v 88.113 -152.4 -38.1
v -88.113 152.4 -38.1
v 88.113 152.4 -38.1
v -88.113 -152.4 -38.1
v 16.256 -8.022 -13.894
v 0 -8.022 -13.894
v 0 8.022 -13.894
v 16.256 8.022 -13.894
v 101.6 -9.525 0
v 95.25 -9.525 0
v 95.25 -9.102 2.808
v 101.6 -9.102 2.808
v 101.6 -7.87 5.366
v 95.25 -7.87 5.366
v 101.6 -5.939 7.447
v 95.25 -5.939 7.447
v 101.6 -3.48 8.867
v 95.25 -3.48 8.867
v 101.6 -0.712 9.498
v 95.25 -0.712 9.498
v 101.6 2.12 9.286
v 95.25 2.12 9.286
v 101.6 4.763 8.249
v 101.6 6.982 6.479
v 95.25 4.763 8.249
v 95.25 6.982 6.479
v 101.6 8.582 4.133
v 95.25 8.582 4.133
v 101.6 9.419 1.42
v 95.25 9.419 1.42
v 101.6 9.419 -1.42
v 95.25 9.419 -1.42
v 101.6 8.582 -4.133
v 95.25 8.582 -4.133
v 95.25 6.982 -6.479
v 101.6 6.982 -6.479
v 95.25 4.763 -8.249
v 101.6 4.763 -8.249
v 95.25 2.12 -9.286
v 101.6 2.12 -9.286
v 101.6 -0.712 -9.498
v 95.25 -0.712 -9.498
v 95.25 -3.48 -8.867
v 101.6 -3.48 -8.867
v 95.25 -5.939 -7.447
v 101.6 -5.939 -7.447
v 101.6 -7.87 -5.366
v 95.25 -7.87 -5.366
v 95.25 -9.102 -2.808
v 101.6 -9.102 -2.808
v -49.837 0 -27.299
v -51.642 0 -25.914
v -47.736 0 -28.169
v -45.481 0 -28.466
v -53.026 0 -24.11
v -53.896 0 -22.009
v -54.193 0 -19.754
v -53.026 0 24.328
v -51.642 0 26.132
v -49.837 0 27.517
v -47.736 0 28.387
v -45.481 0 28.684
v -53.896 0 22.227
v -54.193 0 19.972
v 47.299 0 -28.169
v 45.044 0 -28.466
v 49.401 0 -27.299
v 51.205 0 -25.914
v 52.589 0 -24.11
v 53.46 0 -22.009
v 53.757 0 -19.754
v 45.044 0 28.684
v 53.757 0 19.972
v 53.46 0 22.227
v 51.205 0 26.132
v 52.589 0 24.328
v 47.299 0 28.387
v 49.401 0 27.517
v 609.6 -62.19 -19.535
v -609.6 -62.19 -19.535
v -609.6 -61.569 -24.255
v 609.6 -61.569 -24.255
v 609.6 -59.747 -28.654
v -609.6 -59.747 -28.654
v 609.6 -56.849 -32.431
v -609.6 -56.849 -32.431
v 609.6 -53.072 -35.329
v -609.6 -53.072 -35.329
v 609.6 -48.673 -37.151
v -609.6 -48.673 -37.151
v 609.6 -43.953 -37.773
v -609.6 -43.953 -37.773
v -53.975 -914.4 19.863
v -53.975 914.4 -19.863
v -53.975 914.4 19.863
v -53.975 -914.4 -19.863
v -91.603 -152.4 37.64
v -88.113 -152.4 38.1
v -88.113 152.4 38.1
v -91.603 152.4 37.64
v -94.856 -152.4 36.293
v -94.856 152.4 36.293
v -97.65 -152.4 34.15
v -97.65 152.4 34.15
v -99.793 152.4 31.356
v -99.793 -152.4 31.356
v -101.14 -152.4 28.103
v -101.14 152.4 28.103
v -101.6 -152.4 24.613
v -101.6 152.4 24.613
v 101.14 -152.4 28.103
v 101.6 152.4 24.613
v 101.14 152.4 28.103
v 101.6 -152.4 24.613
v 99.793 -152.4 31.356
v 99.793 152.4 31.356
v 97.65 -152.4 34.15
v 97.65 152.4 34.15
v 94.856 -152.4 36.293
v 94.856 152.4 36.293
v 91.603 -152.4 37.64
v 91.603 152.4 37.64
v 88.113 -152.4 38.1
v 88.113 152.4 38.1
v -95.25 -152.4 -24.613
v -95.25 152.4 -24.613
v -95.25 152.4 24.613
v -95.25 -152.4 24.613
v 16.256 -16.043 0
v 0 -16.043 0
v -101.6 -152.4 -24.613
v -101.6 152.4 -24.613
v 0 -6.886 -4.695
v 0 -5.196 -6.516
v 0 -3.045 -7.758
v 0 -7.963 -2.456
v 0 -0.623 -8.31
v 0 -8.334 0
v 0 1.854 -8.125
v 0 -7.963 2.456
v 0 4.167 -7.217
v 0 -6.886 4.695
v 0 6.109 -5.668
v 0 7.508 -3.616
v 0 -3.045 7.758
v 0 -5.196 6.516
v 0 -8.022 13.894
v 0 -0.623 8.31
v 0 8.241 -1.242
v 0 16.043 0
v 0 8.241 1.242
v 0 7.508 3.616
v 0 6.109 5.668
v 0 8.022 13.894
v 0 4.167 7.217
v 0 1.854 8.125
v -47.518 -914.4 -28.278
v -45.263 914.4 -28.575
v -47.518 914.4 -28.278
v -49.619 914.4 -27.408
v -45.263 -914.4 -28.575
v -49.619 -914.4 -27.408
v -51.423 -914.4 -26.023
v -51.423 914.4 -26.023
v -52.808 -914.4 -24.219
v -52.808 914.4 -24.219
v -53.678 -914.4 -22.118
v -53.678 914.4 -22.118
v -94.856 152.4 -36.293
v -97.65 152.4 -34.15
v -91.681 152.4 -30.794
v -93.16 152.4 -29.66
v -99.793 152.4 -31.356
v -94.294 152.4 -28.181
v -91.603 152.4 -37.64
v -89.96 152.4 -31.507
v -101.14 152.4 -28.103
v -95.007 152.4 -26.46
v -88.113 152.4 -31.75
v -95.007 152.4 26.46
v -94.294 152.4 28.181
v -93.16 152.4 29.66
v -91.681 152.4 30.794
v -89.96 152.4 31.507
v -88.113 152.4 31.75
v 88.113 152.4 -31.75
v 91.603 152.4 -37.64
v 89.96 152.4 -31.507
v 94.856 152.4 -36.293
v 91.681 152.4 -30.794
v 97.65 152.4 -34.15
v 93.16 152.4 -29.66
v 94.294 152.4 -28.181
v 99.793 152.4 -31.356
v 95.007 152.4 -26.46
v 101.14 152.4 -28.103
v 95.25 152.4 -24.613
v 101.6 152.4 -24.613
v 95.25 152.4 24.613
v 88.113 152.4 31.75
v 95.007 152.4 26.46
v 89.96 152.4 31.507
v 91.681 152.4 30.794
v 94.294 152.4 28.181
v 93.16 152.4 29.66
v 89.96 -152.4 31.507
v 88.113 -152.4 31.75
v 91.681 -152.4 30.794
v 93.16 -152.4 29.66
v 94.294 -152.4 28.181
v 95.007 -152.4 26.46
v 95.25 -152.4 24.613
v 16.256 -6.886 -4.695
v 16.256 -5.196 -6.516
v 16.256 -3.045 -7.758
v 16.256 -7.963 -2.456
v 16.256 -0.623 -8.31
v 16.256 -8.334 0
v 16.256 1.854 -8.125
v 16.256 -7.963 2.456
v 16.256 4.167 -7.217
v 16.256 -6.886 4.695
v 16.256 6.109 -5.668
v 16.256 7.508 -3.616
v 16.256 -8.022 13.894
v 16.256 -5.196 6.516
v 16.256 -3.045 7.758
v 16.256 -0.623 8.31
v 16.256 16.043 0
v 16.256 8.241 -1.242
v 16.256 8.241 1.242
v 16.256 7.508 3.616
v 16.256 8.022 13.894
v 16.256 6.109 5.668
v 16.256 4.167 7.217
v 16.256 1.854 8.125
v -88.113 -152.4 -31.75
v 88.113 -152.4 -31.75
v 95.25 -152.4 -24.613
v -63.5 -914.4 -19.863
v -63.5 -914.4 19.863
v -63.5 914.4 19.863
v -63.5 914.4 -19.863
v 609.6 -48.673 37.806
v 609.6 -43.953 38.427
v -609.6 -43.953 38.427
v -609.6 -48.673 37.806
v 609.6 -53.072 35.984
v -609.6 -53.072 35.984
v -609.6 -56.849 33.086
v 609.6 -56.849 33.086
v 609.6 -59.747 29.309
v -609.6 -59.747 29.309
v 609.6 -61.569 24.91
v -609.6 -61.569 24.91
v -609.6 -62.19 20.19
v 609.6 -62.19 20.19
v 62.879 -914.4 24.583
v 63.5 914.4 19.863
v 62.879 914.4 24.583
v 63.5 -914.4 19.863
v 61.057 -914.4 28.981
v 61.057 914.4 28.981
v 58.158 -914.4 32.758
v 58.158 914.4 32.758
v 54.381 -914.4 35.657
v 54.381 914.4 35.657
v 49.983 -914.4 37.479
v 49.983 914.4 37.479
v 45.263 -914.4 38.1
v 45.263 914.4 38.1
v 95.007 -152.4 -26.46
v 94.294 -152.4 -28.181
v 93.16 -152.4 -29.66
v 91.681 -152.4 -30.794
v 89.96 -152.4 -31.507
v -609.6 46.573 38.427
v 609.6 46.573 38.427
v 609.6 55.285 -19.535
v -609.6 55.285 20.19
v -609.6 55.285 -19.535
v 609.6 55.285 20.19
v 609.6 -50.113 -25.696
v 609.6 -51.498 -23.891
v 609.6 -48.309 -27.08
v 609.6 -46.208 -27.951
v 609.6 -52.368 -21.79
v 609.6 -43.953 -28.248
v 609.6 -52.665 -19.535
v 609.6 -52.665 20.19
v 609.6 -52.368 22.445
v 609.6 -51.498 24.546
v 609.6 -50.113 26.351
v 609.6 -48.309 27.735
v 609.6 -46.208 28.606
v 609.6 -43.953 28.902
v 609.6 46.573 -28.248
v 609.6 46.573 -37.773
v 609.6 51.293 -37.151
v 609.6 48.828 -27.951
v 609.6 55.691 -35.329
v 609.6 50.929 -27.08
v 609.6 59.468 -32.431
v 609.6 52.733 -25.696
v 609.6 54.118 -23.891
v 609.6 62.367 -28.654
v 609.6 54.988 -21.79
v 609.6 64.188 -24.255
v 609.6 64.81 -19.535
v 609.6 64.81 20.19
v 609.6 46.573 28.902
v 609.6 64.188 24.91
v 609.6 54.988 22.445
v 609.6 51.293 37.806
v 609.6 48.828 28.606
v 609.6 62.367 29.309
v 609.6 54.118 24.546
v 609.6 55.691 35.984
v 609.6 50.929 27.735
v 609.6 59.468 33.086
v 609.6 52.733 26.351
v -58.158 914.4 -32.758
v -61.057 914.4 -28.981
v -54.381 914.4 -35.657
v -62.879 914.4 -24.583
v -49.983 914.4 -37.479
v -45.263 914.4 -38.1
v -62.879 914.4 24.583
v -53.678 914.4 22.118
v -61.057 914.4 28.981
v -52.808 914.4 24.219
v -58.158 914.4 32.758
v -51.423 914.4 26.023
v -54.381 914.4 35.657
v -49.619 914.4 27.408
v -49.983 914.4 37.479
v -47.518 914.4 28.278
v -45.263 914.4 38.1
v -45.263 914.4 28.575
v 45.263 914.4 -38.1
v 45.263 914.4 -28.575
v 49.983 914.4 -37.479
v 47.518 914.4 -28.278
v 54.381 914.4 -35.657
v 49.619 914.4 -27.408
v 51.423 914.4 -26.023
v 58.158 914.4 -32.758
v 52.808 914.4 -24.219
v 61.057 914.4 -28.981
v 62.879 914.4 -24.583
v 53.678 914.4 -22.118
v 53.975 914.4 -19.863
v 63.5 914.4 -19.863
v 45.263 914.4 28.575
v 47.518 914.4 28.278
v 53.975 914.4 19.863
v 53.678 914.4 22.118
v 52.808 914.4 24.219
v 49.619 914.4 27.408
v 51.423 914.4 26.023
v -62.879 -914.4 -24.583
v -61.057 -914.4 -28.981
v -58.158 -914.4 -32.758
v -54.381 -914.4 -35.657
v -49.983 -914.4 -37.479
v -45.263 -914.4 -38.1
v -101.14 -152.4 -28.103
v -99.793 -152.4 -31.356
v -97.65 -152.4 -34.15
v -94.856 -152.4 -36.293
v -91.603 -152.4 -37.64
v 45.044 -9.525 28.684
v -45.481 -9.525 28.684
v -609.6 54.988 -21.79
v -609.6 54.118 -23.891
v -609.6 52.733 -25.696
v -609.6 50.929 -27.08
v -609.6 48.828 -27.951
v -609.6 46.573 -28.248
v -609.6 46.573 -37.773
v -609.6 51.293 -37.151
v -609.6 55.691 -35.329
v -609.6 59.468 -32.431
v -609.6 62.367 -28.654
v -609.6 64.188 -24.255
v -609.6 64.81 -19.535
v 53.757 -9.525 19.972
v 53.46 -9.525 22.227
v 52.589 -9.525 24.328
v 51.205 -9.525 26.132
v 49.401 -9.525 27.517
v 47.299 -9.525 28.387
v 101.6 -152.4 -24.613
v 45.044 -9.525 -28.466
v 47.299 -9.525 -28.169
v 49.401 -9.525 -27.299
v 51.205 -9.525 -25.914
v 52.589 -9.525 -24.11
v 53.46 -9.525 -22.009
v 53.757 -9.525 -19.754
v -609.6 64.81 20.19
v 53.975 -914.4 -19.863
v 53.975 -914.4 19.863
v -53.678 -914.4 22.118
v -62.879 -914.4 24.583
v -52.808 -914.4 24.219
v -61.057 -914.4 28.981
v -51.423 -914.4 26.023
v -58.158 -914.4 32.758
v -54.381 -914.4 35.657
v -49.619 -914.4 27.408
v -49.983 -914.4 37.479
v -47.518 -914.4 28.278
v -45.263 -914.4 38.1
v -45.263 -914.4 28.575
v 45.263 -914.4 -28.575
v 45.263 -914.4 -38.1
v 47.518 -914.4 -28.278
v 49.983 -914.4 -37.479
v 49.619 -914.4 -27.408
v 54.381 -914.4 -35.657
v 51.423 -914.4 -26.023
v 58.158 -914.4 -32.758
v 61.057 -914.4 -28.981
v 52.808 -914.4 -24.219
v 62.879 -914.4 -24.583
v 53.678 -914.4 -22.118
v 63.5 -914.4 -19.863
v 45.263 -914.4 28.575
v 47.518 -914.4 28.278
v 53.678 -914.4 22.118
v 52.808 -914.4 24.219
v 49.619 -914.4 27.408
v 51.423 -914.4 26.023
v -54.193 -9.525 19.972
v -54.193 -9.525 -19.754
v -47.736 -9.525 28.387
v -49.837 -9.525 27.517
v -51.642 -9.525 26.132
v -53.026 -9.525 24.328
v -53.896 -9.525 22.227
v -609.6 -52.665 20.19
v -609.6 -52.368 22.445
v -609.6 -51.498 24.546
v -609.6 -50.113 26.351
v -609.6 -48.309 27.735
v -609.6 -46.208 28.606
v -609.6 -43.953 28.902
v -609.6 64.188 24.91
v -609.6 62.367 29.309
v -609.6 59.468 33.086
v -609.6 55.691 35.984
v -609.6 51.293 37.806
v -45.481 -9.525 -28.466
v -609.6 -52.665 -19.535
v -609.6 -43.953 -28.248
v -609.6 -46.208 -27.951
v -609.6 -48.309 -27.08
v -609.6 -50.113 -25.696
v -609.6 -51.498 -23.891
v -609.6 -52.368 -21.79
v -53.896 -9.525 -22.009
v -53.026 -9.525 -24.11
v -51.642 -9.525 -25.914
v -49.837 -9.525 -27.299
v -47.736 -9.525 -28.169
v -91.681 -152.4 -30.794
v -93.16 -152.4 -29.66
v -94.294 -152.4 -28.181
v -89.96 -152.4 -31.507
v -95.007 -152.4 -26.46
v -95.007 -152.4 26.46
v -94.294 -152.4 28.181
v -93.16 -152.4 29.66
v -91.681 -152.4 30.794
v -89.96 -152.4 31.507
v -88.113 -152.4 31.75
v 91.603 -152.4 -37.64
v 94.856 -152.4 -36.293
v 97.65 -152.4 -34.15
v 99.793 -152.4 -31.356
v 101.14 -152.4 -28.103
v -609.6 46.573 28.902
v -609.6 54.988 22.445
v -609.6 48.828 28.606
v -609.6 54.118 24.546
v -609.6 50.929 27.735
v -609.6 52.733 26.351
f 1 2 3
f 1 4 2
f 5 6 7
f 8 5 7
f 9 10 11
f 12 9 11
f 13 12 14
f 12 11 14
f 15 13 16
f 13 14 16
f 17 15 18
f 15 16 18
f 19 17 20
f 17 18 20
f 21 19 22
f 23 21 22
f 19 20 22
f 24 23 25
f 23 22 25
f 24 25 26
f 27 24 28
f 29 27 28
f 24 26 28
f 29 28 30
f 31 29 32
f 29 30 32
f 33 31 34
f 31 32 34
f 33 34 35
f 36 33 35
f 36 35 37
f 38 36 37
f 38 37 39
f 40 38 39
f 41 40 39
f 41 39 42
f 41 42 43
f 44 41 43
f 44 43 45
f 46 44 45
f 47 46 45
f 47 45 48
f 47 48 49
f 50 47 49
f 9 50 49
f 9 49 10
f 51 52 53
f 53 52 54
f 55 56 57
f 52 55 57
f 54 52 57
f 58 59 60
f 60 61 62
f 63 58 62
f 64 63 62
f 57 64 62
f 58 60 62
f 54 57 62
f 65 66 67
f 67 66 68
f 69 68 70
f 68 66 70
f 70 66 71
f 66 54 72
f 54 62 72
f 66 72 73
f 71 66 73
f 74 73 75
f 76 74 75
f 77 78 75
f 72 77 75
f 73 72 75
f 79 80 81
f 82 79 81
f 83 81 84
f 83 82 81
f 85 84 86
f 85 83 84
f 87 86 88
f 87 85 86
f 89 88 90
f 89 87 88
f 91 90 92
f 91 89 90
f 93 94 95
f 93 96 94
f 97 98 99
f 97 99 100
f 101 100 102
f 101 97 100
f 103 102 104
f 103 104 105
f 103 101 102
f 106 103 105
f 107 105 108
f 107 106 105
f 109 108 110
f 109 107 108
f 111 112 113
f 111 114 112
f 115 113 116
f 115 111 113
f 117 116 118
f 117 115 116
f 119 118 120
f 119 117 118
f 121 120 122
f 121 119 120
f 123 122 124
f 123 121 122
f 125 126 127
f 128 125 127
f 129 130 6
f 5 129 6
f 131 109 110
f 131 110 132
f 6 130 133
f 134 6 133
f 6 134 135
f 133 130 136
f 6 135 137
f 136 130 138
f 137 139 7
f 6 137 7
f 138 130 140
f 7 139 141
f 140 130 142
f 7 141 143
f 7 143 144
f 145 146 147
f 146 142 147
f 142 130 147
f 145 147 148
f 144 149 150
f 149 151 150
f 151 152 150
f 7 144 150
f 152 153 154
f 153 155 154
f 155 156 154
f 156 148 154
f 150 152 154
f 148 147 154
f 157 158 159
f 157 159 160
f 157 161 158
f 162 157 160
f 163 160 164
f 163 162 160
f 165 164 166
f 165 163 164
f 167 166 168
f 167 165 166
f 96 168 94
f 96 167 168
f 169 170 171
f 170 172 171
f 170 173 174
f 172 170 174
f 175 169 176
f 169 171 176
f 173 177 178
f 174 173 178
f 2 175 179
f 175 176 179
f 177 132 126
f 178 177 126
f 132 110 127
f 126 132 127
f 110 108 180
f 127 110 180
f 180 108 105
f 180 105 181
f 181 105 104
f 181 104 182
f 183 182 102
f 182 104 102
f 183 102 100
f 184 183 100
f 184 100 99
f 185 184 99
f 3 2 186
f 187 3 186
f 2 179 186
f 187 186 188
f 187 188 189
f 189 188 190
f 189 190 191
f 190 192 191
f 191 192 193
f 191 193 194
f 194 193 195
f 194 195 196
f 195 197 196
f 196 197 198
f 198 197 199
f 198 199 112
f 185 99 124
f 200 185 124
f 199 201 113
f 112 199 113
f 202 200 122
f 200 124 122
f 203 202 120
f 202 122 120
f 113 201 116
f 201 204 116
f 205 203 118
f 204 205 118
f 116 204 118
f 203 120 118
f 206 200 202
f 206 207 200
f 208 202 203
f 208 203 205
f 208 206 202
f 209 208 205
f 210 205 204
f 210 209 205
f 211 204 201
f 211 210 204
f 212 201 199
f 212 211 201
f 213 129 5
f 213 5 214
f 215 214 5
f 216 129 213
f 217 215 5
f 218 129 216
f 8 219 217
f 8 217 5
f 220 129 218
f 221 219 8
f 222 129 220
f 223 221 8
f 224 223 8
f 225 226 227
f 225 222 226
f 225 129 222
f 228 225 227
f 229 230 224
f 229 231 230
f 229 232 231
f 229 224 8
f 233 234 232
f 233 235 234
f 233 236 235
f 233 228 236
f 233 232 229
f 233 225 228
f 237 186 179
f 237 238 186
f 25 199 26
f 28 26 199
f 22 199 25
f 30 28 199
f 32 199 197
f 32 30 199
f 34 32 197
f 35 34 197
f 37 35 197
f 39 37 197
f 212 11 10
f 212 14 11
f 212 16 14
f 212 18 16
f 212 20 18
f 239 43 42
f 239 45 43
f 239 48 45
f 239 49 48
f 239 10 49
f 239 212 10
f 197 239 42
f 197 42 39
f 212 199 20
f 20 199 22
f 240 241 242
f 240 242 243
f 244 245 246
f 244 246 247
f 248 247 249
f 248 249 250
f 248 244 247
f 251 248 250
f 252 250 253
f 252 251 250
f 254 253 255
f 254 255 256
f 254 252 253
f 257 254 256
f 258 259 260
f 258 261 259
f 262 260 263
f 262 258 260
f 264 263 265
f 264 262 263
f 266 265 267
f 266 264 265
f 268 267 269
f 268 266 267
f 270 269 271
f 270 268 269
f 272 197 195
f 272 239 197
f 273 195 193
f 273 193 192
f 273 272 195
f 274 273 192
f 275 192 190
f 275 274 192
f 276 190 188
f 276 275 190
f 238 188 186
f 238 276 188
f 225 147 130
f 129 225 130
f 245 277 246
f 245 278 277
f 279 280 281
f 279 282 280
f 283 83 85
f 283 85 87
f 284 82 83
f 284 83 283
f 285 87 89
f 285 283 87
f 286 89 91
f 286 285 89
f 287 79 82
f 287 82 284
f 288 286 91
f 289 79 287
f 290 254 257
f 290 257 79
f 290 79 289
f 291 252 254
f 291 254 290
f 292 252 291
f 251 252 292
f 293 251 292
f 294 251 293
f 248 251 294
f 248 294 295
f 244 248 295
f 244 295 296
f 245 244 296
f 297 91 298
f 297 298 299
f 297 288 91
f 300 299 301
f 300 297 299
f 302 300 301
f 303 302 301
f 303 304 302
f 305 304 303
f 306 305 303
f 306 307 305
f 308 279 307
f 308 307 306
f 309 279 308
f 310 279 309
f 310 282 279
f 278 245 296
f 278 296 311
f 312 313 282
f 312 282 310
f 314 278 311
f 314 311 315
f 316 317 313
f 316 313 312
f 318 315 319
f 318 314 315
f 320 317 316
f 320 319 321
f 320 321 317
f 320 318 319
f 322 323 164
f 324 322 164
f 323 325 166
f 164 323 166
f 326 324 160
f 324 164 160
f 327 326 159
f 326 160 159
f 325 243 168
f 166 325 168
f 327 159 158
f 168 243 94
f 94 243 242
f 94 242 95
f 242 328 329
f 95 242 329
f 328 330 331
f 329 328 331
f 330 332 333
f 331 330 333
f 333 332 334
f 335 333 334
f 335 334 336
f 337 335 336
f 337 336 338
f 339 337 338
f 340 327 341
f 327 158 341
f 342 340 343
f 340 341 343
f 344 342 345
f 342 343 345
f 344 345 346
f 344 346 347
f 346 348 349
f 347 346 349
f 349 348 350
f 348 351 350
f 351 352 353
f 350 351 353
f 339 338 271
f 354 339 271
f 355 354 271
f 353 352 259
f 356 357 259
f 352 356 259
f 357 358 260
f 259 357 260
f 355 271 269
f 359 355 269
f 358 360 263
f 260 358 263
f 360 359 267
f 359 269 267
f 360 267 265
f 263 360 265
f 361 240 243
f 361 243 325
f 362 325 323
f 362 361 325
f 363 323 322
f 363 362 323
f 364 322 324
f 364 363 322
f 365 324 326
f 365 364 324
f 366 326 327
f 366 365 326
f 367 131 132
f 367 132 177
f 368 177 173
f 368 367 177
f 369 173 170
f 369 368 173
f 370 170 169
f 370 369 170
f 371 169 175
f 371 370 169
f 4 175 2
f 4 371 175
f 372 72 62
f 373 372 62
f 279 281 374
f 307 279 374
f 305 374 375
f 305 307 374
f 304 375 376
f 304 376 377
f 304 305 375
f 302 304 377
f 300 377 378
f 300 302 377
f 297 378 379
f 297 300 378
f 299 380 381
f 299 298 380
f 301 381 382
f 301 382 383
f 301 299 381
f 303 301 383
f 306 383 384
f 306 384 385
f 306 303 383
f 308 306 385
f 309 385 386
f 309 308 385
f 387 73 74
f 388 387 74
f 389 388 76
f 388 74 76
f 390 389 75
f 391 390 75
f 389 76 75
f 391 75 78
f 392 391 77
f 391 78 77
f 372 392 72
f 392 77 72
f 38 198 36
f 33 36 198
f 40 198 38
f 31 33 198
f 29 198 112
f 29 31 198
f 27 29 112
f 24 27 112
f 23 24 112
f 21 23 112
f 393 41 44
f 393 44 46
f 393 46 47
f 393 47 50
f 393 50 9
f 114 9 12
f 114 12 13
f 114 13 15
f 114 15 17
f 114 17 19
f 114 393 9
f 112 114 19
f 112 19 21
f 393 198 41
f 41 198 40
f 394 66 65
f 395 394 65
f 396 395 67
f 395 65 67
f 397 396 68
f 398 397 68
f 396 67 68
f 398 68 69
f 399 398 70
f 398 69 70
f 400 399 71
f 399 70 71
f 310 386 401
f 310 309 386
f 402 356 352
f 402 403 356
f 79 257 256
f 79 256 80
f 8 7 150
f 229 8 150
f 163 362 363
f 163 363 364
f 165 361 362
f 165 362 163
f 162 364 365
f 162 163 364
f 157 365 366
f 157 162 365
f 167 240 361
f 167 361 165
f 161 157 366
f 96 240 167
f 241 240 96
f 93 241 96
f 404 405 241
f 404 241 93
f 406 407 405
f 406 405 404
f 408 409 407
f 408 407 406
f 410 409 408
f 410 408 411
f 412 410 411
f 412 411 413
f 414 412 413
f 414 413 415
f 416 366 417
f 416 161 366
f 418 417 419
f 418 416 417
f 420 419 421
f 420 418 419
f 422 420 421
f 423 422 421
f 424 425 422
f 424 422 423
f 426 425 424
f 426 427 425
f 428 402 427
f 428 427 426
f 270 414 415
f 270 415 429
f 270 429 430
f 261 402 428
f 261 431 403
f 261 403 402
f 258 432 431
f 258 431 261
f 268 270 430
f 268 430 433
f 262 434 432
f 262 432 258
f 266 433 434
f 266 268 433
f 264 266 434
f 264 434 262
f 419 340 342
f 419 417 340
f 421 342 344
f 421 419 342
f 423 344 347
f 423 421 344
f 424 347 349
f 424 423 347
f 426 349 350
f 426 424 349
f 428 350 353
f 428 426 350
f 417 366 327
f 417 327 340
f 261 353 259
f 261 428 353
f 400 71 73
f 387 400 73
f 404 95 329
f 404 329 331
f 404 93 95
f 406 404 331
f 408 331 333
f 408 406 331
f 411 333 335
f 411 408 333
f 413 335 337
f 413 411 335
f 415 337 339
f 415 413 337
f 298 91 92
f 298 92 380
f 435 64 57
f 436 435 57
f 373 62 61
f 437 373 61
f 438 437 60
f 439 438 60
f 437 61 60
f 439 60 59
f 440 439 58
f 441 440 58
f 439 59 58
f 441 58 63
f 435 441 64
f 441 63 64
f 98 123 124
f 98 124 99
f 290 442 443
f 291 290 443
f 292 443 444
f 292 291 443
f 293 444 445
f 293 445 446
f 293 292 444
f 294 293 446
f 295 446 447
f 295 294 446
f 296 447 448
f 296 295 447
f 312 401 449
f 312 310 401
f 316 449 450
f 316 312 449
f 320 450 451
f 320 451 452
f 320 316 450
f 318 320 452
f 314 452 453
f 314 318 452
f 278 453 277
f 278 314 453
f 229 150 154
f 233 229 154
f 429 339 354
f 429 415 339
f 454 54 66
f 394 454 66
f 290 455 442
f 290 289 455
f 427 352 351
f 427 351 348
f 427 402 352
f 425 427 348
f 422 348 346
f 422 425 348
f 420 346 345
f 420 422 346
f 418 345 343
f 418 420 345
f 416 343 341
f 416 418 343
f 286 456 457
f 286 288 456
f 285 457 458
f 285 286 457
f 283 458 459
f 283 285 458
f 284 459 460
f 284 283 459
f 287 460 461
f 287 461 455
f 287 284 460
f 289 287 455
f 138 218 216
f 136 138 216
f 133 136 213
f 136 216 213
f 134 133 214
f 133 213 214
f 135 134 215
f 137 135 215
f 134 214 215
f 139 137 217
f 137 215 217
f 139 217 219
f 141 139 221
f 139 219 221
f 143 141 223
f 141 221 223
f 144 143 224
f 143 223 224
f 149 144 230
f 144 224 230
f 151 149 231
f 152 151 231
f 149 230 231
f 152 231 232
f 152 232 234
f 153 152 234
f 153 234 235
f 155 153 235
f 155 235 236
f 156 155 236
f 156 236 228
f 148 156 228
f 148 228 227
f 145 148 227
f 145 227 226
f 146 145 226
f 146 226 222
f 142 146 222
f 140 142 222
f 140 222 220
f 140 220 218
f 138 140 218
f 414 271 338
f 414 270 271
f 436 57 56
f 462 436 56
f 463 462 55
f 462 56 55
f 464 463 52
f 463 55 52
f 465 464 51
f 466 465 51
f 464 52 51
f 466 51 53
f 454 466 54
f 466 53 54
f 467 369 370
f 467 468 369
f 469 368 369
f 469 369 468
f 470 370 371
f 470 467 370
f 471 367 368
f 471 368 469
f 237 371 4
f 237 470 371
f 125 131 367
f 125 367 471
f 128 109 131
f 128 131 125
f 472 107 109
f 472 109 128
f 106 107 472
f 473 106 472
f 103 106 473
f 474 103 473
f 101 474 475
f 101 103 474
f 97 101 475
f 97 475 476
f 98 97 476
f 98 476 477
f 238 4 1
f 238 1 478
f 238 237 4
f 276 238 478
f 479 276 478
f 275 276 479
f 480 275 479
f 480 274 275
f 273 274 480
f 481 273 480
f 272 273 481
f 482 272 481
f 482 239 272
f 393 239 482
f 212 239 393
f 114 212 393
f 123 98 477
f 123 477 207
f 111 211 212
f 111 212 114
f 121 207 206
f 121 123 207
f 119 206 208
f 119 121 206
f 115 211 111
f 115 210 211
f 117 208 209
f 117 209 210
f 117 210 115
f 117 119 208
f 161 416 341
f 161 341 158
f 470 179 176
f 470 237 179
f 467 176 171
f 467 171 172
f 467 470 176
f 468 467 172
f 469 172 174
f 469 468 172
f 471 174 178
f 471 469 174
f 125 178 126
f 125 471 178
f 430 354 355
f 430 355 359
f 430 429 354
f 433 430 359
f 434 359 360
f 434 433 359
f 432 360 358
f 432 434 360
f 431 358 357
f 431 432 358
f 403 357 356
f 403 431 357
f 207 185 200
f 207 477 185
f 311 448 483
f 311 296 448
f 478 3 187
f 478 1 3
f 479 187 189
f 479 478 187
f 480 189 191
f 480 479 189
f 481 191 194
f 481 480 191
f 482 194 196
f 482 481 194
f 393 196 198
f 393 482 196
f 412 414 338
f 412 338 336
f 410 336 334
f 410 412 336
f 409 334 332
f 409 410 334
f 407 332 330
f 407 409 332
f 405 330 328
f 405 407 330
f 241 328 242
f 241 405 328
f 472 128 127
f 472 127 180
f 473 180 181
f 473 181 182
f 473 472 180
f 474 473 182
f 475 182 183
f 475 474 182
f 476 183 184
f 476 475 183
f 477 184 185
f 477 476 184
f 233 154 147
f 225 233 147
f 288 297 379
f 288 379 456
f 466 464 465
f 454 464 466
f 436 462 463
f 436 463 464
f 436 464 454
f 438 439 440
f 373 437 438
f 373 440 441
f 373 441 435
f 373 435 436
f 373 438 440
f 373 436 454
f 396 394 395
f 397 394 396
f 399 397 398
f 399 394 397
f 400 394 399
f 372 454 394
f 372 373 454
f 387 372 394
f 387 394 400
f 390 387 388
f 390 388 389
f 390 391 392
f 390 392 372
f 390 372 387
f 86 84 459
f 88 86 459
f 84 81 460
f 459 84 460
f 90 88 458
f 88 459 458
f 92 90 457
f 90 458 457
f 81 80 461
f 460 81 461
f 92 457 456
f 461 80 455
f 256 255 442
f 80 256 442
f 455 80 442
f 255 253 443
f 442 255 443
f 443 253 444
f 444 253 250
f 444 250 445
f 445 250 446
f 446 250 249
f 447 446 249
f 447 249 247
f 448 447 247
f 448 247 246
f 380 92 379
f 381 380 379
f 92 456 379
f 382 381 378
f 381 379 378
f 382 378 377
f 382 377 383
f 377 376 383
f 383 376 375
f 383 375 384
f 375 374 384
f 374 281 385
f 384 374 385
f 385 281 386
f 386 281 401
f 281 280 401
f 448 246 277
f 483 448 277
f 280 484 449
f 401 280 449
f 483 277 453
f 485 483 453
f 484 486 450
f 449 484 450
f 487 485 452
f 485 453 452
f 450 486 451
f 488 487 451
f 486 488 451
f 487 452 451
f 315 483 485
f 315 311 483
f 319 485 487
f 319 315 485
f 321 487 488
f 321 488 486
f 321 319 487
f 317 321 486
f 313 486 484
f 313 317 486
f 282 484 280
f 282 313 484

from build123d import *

# Parameters (mm, degrees)
F1_DEPTH  = 152.4
F3_D      = 19.05
F3_DEPTH  = 12.7
F3_TIP    = 5.7231973962
F5_DEPTH  = 16.256
F6_D      = 16.66748
F8_DEPTH  = 914.4
F10_DEPTH = 609.6
F12_DEPTH = 9.525


# Not quite as in the source:
# - ends of sketch curves that miss each other by under 0.0002 mm in the source are joined


with BuildPart() as f1:
    # F0 (on Front) → F1 (new body, symmetric)
    with BuildSketch(Plane.XZ):
        with BuildLine():
            ThreePointArc((101.6, 24.6126), (97.6496320006, 34.1496320006), (88.1126, 38.1))
            Line((88.1126, 38.1), (-88.1126, 38.1))
            ThreePointArc((-88.1126, 38.1), (-97.6496337703, 34.1496337703), (-101.6000025028, 24.6126))
            Line((-101.6000025028, 24.6126), (-101.6, -24.6126))
            ThreePointArc((-101.6, -24.6126), (-97.6496320006, -34.1496320006), (-88.1126, -38.1))
            Line((-88.1126, -38.1), (88.1126, -38.1))
            ThreePointArc((88.1126, -38.1), (97.6496320006, -34.1496320006), (101.6, -24.6126))
            Line((101.6, -24.6126), (101.6, 24.6126))
        make_face()
        with BuildLine():
            ThreePointArc((-95.25, 24.6126), (-93.15950394, 29.65950394), (-88.1126, 31.75))
            Line((-88.1126, 31.75), (88.1126, 31.75))
            ThreePointArc((88.1126, 31.75), (93.15950394, 29.65950394), (95.25, 24.6126))
            Line((95.25, 24.6126), (95.25, -24.6126))
            ThreePointArc((95.25, -24.6126), (93.15950394, -29.65950394), (88.1126, -31.75))
            Line((88.1126, -31.75), (-88.1126, -31.75))
            ThreePointArc((-88.1126, -31.75), (-93.15950394, -29.65950394), (-95.25, -24.6126))
            Line((-95.25, -24.6126), (-95.25, 24.6126))
        make_face(mode=Mode.SUBTRACT)
    extrude(amount=F1_DEPTH, both=True)

    # F3
    with Locations(Plane.YZ.offset(101.6)):
        with Locations((0, 0)):
            Hole(F3_D / 2, depth=F3_DEPTH)
            with Locations((0, 0, -(F3_DEPTH + F3_TIP / 2))):  # 118° drill point
                Cone(0, F3_D / 2, F3_TIP, mode=Mode.SUBTRACT)


with BuildPart() as f5:
    # F4 (on Right) → F5 (new body)
    with BuildSketch(Plane.YZ):
        Polygon((8.0215891701, 13.8938), (-8.0215891701, 13.8938), (-16.0431783401, 0), (-8.0215891701, -13.8938), (8.0215891701, -13.8938), (16.0431783401, 0), align=None)
    extrude(amount=F5_DEPTH)

    # F6 (through all)
    with Locations(Plane(origin=(0, 0, 0), x_dir=(0, 1, 0), z_dir=(-1, 0, 0))):
        with Locations((0, 0)):
            Hole(F6_D / 2)


with BuildPart() as f8:
    # F7 (on Front) → F8 (new body, symmetric)
    with BuildSketch(Plane.XZ):
        with BuildLine():
            Line((45.2628, 38.1), (-45.2628, 38.1))
            ThreePointArc((-45.2628, 38.1), (-58.1584477899, 32.7584477899), (-63.5, 19.8628))
            Line((-63.5, 19.8628), (-63.5, -19.8628))
            ThreePointArc((-63.5, -19.8628), (-58.1584477899, -32.7584477899), (-45.2628, -38.1))
            Line((-45.2628, -38.1), (45.2628, -38.1))
            ThreePointArc((45.2628, -38.1), (58.1584477899, -32.7584477899), (63.5, -19.8628))
            Line((63.5, -19.8628), (63.5, 19.8628))
            ThreePointArc((63.5, 19.8628), (58.1584477899, 32.7584477899), (45.2628, 38.1))
        make_face()
        with BuildLine():
            Line((45.2628, -28.575), (-45.2628, -28.575))
            ThreePointArc((-45.2628, -28.575), (-51.4232556991, -26.0232556991), (-53.975, -19.8628))
            Line((-53.975, -19.8628), (-53.975, 19.8628))
            ThreePointArc((-53.975, 19.8628), (-51.4232556991, 26.0232556991), (-45.2628, 28.575))
            Line((-45.2628, 28.575), (45.2628, 28.575))
            ThreePointArc((45.2628, 28.575), (51.4232556991, 26.0232556991), (53.975, 19.8628))
            Line((53.975, 19.8628), (53.975, -19.8628))
            ThreePointArc((53.975, -19.8628), (51.4232556991, -26.0232556991), (45.2628, -28.575))
        make_face(mode=Mode.SUBTRACT)
    extrude(amount=F8_DEPTH, both=True)


with BuildPart() as f10:
    # F9 (on Right) → F10 (new body, symmetric)
    with BuildSketch(Plane.YZ):
        with BuildLine():
            Line((46.5726517666, 38.427462476), (-43.9529482334, 38.427462476))
            ThreePointArc((-43.9529482334, 38.427462476), (-56.8485960233, 33.0859102658), (-62.1901482334, 20.190262476))
            Line((-62.1901482334, 20.190262476), (-62.1901482334, -19.535337524))
            ThreePointArc((-62.1901482334, -19.535337524), (-56.8485960233, -32.4309853139), (-43.9529482334, -37.772537524))
            Line((-43.9529482334, -37.772537524), (46.5726517666, -37.772537524))
            ThreePointArc((46.5726517666, -37.772537524), (59.4682995564, -32.4309853139), (64.8098517666, -19.535337524))
            Line((64.8098517666, -19.535337524), (64.8098517666, 20.190262476))
            ThreePointArc((64.8098517666, 20.190262476), (59.4682995564, 33.0859102658), (46.5726517666, 38.427462476))
        make_face()
        with BuildLine():
            Line((46.5726517666, -28.247537524), (-43.9529482334, -28.247537524))
            ThreePointArc((-43.9529482334, -28.247537524), (-50.1134039325, -25.6957932231), (-52.6651482334, -19.535337524))
            Line((-52.6651482334, -19.535337524), (-52.6651482334, 20.190262476))
            ThreePointArc((-52.6651482334, 20.190262476), (-50.1134039325, 26.350718175), (-43.9529482334, 28.902462476))
            Line((-43.9529482334, 28.902462476), (46.5726517666, 28.902462476))
            ThreePointArc((46.5726517666, 28.902462476), (52.7331074656, 26.350718175), (55.2848517666, 20.190262476))
            Line((55.2848517666, 20.190262476), (55.2848517666, -19.535337524))
            ThreePointArc((55.2848517666, -19.535337524), (52.7331074656, -25.6957932231), (46.5726517666, -28.247537524))
        make_face(mode=Mode.SUBTRACT)
    extrude(amount=F10_DEPTH, both=True)


with BuildPart() as f12:
    # F11 (on Front) → F12 (new body)
    with BuildSketch(Plane.XZ):
        with BuildLine():
            ThreePointArc((-54.1933096803, -19.7536458365), (-51.6415653794, -25.9141015355), (-45.4811096803, -28.4658458365))
            Line((-45.4811096803, -28.4658458365), (45.0444903197, -28.4658458365))
            ThreePointArc((45.0444903197, -28.4658458365), (51.2049460187, -25.9141015355), (53.7566903197, -19.7536458365))
            Line((53.7566903197, -19.7536458365), (53.7566903197, 19.9719541635))
            ThreePointArc((53.7566903197, 19.9719541635), (51.2049460187, 26.1324098626), (45.0444903197, 28.6841541635))
            Line((45.0444903197, 28.6841541635), (-45.4811096803, 28.6841541635))
            ThreePointArc((-45.4811096803, 28.6841541635), (-51.6415653794, 26.1324098626), (-54.1933096803, 19.9719541635))
            Line((-54.1933096803, 19.9719541635), (-54.1933096803, -19.7536458365))
        make_face()
    extrude(amount=F12_DEPTH)


solid = Compound([f1.part, f5.part, f8.part, f10.part, f12.part])
